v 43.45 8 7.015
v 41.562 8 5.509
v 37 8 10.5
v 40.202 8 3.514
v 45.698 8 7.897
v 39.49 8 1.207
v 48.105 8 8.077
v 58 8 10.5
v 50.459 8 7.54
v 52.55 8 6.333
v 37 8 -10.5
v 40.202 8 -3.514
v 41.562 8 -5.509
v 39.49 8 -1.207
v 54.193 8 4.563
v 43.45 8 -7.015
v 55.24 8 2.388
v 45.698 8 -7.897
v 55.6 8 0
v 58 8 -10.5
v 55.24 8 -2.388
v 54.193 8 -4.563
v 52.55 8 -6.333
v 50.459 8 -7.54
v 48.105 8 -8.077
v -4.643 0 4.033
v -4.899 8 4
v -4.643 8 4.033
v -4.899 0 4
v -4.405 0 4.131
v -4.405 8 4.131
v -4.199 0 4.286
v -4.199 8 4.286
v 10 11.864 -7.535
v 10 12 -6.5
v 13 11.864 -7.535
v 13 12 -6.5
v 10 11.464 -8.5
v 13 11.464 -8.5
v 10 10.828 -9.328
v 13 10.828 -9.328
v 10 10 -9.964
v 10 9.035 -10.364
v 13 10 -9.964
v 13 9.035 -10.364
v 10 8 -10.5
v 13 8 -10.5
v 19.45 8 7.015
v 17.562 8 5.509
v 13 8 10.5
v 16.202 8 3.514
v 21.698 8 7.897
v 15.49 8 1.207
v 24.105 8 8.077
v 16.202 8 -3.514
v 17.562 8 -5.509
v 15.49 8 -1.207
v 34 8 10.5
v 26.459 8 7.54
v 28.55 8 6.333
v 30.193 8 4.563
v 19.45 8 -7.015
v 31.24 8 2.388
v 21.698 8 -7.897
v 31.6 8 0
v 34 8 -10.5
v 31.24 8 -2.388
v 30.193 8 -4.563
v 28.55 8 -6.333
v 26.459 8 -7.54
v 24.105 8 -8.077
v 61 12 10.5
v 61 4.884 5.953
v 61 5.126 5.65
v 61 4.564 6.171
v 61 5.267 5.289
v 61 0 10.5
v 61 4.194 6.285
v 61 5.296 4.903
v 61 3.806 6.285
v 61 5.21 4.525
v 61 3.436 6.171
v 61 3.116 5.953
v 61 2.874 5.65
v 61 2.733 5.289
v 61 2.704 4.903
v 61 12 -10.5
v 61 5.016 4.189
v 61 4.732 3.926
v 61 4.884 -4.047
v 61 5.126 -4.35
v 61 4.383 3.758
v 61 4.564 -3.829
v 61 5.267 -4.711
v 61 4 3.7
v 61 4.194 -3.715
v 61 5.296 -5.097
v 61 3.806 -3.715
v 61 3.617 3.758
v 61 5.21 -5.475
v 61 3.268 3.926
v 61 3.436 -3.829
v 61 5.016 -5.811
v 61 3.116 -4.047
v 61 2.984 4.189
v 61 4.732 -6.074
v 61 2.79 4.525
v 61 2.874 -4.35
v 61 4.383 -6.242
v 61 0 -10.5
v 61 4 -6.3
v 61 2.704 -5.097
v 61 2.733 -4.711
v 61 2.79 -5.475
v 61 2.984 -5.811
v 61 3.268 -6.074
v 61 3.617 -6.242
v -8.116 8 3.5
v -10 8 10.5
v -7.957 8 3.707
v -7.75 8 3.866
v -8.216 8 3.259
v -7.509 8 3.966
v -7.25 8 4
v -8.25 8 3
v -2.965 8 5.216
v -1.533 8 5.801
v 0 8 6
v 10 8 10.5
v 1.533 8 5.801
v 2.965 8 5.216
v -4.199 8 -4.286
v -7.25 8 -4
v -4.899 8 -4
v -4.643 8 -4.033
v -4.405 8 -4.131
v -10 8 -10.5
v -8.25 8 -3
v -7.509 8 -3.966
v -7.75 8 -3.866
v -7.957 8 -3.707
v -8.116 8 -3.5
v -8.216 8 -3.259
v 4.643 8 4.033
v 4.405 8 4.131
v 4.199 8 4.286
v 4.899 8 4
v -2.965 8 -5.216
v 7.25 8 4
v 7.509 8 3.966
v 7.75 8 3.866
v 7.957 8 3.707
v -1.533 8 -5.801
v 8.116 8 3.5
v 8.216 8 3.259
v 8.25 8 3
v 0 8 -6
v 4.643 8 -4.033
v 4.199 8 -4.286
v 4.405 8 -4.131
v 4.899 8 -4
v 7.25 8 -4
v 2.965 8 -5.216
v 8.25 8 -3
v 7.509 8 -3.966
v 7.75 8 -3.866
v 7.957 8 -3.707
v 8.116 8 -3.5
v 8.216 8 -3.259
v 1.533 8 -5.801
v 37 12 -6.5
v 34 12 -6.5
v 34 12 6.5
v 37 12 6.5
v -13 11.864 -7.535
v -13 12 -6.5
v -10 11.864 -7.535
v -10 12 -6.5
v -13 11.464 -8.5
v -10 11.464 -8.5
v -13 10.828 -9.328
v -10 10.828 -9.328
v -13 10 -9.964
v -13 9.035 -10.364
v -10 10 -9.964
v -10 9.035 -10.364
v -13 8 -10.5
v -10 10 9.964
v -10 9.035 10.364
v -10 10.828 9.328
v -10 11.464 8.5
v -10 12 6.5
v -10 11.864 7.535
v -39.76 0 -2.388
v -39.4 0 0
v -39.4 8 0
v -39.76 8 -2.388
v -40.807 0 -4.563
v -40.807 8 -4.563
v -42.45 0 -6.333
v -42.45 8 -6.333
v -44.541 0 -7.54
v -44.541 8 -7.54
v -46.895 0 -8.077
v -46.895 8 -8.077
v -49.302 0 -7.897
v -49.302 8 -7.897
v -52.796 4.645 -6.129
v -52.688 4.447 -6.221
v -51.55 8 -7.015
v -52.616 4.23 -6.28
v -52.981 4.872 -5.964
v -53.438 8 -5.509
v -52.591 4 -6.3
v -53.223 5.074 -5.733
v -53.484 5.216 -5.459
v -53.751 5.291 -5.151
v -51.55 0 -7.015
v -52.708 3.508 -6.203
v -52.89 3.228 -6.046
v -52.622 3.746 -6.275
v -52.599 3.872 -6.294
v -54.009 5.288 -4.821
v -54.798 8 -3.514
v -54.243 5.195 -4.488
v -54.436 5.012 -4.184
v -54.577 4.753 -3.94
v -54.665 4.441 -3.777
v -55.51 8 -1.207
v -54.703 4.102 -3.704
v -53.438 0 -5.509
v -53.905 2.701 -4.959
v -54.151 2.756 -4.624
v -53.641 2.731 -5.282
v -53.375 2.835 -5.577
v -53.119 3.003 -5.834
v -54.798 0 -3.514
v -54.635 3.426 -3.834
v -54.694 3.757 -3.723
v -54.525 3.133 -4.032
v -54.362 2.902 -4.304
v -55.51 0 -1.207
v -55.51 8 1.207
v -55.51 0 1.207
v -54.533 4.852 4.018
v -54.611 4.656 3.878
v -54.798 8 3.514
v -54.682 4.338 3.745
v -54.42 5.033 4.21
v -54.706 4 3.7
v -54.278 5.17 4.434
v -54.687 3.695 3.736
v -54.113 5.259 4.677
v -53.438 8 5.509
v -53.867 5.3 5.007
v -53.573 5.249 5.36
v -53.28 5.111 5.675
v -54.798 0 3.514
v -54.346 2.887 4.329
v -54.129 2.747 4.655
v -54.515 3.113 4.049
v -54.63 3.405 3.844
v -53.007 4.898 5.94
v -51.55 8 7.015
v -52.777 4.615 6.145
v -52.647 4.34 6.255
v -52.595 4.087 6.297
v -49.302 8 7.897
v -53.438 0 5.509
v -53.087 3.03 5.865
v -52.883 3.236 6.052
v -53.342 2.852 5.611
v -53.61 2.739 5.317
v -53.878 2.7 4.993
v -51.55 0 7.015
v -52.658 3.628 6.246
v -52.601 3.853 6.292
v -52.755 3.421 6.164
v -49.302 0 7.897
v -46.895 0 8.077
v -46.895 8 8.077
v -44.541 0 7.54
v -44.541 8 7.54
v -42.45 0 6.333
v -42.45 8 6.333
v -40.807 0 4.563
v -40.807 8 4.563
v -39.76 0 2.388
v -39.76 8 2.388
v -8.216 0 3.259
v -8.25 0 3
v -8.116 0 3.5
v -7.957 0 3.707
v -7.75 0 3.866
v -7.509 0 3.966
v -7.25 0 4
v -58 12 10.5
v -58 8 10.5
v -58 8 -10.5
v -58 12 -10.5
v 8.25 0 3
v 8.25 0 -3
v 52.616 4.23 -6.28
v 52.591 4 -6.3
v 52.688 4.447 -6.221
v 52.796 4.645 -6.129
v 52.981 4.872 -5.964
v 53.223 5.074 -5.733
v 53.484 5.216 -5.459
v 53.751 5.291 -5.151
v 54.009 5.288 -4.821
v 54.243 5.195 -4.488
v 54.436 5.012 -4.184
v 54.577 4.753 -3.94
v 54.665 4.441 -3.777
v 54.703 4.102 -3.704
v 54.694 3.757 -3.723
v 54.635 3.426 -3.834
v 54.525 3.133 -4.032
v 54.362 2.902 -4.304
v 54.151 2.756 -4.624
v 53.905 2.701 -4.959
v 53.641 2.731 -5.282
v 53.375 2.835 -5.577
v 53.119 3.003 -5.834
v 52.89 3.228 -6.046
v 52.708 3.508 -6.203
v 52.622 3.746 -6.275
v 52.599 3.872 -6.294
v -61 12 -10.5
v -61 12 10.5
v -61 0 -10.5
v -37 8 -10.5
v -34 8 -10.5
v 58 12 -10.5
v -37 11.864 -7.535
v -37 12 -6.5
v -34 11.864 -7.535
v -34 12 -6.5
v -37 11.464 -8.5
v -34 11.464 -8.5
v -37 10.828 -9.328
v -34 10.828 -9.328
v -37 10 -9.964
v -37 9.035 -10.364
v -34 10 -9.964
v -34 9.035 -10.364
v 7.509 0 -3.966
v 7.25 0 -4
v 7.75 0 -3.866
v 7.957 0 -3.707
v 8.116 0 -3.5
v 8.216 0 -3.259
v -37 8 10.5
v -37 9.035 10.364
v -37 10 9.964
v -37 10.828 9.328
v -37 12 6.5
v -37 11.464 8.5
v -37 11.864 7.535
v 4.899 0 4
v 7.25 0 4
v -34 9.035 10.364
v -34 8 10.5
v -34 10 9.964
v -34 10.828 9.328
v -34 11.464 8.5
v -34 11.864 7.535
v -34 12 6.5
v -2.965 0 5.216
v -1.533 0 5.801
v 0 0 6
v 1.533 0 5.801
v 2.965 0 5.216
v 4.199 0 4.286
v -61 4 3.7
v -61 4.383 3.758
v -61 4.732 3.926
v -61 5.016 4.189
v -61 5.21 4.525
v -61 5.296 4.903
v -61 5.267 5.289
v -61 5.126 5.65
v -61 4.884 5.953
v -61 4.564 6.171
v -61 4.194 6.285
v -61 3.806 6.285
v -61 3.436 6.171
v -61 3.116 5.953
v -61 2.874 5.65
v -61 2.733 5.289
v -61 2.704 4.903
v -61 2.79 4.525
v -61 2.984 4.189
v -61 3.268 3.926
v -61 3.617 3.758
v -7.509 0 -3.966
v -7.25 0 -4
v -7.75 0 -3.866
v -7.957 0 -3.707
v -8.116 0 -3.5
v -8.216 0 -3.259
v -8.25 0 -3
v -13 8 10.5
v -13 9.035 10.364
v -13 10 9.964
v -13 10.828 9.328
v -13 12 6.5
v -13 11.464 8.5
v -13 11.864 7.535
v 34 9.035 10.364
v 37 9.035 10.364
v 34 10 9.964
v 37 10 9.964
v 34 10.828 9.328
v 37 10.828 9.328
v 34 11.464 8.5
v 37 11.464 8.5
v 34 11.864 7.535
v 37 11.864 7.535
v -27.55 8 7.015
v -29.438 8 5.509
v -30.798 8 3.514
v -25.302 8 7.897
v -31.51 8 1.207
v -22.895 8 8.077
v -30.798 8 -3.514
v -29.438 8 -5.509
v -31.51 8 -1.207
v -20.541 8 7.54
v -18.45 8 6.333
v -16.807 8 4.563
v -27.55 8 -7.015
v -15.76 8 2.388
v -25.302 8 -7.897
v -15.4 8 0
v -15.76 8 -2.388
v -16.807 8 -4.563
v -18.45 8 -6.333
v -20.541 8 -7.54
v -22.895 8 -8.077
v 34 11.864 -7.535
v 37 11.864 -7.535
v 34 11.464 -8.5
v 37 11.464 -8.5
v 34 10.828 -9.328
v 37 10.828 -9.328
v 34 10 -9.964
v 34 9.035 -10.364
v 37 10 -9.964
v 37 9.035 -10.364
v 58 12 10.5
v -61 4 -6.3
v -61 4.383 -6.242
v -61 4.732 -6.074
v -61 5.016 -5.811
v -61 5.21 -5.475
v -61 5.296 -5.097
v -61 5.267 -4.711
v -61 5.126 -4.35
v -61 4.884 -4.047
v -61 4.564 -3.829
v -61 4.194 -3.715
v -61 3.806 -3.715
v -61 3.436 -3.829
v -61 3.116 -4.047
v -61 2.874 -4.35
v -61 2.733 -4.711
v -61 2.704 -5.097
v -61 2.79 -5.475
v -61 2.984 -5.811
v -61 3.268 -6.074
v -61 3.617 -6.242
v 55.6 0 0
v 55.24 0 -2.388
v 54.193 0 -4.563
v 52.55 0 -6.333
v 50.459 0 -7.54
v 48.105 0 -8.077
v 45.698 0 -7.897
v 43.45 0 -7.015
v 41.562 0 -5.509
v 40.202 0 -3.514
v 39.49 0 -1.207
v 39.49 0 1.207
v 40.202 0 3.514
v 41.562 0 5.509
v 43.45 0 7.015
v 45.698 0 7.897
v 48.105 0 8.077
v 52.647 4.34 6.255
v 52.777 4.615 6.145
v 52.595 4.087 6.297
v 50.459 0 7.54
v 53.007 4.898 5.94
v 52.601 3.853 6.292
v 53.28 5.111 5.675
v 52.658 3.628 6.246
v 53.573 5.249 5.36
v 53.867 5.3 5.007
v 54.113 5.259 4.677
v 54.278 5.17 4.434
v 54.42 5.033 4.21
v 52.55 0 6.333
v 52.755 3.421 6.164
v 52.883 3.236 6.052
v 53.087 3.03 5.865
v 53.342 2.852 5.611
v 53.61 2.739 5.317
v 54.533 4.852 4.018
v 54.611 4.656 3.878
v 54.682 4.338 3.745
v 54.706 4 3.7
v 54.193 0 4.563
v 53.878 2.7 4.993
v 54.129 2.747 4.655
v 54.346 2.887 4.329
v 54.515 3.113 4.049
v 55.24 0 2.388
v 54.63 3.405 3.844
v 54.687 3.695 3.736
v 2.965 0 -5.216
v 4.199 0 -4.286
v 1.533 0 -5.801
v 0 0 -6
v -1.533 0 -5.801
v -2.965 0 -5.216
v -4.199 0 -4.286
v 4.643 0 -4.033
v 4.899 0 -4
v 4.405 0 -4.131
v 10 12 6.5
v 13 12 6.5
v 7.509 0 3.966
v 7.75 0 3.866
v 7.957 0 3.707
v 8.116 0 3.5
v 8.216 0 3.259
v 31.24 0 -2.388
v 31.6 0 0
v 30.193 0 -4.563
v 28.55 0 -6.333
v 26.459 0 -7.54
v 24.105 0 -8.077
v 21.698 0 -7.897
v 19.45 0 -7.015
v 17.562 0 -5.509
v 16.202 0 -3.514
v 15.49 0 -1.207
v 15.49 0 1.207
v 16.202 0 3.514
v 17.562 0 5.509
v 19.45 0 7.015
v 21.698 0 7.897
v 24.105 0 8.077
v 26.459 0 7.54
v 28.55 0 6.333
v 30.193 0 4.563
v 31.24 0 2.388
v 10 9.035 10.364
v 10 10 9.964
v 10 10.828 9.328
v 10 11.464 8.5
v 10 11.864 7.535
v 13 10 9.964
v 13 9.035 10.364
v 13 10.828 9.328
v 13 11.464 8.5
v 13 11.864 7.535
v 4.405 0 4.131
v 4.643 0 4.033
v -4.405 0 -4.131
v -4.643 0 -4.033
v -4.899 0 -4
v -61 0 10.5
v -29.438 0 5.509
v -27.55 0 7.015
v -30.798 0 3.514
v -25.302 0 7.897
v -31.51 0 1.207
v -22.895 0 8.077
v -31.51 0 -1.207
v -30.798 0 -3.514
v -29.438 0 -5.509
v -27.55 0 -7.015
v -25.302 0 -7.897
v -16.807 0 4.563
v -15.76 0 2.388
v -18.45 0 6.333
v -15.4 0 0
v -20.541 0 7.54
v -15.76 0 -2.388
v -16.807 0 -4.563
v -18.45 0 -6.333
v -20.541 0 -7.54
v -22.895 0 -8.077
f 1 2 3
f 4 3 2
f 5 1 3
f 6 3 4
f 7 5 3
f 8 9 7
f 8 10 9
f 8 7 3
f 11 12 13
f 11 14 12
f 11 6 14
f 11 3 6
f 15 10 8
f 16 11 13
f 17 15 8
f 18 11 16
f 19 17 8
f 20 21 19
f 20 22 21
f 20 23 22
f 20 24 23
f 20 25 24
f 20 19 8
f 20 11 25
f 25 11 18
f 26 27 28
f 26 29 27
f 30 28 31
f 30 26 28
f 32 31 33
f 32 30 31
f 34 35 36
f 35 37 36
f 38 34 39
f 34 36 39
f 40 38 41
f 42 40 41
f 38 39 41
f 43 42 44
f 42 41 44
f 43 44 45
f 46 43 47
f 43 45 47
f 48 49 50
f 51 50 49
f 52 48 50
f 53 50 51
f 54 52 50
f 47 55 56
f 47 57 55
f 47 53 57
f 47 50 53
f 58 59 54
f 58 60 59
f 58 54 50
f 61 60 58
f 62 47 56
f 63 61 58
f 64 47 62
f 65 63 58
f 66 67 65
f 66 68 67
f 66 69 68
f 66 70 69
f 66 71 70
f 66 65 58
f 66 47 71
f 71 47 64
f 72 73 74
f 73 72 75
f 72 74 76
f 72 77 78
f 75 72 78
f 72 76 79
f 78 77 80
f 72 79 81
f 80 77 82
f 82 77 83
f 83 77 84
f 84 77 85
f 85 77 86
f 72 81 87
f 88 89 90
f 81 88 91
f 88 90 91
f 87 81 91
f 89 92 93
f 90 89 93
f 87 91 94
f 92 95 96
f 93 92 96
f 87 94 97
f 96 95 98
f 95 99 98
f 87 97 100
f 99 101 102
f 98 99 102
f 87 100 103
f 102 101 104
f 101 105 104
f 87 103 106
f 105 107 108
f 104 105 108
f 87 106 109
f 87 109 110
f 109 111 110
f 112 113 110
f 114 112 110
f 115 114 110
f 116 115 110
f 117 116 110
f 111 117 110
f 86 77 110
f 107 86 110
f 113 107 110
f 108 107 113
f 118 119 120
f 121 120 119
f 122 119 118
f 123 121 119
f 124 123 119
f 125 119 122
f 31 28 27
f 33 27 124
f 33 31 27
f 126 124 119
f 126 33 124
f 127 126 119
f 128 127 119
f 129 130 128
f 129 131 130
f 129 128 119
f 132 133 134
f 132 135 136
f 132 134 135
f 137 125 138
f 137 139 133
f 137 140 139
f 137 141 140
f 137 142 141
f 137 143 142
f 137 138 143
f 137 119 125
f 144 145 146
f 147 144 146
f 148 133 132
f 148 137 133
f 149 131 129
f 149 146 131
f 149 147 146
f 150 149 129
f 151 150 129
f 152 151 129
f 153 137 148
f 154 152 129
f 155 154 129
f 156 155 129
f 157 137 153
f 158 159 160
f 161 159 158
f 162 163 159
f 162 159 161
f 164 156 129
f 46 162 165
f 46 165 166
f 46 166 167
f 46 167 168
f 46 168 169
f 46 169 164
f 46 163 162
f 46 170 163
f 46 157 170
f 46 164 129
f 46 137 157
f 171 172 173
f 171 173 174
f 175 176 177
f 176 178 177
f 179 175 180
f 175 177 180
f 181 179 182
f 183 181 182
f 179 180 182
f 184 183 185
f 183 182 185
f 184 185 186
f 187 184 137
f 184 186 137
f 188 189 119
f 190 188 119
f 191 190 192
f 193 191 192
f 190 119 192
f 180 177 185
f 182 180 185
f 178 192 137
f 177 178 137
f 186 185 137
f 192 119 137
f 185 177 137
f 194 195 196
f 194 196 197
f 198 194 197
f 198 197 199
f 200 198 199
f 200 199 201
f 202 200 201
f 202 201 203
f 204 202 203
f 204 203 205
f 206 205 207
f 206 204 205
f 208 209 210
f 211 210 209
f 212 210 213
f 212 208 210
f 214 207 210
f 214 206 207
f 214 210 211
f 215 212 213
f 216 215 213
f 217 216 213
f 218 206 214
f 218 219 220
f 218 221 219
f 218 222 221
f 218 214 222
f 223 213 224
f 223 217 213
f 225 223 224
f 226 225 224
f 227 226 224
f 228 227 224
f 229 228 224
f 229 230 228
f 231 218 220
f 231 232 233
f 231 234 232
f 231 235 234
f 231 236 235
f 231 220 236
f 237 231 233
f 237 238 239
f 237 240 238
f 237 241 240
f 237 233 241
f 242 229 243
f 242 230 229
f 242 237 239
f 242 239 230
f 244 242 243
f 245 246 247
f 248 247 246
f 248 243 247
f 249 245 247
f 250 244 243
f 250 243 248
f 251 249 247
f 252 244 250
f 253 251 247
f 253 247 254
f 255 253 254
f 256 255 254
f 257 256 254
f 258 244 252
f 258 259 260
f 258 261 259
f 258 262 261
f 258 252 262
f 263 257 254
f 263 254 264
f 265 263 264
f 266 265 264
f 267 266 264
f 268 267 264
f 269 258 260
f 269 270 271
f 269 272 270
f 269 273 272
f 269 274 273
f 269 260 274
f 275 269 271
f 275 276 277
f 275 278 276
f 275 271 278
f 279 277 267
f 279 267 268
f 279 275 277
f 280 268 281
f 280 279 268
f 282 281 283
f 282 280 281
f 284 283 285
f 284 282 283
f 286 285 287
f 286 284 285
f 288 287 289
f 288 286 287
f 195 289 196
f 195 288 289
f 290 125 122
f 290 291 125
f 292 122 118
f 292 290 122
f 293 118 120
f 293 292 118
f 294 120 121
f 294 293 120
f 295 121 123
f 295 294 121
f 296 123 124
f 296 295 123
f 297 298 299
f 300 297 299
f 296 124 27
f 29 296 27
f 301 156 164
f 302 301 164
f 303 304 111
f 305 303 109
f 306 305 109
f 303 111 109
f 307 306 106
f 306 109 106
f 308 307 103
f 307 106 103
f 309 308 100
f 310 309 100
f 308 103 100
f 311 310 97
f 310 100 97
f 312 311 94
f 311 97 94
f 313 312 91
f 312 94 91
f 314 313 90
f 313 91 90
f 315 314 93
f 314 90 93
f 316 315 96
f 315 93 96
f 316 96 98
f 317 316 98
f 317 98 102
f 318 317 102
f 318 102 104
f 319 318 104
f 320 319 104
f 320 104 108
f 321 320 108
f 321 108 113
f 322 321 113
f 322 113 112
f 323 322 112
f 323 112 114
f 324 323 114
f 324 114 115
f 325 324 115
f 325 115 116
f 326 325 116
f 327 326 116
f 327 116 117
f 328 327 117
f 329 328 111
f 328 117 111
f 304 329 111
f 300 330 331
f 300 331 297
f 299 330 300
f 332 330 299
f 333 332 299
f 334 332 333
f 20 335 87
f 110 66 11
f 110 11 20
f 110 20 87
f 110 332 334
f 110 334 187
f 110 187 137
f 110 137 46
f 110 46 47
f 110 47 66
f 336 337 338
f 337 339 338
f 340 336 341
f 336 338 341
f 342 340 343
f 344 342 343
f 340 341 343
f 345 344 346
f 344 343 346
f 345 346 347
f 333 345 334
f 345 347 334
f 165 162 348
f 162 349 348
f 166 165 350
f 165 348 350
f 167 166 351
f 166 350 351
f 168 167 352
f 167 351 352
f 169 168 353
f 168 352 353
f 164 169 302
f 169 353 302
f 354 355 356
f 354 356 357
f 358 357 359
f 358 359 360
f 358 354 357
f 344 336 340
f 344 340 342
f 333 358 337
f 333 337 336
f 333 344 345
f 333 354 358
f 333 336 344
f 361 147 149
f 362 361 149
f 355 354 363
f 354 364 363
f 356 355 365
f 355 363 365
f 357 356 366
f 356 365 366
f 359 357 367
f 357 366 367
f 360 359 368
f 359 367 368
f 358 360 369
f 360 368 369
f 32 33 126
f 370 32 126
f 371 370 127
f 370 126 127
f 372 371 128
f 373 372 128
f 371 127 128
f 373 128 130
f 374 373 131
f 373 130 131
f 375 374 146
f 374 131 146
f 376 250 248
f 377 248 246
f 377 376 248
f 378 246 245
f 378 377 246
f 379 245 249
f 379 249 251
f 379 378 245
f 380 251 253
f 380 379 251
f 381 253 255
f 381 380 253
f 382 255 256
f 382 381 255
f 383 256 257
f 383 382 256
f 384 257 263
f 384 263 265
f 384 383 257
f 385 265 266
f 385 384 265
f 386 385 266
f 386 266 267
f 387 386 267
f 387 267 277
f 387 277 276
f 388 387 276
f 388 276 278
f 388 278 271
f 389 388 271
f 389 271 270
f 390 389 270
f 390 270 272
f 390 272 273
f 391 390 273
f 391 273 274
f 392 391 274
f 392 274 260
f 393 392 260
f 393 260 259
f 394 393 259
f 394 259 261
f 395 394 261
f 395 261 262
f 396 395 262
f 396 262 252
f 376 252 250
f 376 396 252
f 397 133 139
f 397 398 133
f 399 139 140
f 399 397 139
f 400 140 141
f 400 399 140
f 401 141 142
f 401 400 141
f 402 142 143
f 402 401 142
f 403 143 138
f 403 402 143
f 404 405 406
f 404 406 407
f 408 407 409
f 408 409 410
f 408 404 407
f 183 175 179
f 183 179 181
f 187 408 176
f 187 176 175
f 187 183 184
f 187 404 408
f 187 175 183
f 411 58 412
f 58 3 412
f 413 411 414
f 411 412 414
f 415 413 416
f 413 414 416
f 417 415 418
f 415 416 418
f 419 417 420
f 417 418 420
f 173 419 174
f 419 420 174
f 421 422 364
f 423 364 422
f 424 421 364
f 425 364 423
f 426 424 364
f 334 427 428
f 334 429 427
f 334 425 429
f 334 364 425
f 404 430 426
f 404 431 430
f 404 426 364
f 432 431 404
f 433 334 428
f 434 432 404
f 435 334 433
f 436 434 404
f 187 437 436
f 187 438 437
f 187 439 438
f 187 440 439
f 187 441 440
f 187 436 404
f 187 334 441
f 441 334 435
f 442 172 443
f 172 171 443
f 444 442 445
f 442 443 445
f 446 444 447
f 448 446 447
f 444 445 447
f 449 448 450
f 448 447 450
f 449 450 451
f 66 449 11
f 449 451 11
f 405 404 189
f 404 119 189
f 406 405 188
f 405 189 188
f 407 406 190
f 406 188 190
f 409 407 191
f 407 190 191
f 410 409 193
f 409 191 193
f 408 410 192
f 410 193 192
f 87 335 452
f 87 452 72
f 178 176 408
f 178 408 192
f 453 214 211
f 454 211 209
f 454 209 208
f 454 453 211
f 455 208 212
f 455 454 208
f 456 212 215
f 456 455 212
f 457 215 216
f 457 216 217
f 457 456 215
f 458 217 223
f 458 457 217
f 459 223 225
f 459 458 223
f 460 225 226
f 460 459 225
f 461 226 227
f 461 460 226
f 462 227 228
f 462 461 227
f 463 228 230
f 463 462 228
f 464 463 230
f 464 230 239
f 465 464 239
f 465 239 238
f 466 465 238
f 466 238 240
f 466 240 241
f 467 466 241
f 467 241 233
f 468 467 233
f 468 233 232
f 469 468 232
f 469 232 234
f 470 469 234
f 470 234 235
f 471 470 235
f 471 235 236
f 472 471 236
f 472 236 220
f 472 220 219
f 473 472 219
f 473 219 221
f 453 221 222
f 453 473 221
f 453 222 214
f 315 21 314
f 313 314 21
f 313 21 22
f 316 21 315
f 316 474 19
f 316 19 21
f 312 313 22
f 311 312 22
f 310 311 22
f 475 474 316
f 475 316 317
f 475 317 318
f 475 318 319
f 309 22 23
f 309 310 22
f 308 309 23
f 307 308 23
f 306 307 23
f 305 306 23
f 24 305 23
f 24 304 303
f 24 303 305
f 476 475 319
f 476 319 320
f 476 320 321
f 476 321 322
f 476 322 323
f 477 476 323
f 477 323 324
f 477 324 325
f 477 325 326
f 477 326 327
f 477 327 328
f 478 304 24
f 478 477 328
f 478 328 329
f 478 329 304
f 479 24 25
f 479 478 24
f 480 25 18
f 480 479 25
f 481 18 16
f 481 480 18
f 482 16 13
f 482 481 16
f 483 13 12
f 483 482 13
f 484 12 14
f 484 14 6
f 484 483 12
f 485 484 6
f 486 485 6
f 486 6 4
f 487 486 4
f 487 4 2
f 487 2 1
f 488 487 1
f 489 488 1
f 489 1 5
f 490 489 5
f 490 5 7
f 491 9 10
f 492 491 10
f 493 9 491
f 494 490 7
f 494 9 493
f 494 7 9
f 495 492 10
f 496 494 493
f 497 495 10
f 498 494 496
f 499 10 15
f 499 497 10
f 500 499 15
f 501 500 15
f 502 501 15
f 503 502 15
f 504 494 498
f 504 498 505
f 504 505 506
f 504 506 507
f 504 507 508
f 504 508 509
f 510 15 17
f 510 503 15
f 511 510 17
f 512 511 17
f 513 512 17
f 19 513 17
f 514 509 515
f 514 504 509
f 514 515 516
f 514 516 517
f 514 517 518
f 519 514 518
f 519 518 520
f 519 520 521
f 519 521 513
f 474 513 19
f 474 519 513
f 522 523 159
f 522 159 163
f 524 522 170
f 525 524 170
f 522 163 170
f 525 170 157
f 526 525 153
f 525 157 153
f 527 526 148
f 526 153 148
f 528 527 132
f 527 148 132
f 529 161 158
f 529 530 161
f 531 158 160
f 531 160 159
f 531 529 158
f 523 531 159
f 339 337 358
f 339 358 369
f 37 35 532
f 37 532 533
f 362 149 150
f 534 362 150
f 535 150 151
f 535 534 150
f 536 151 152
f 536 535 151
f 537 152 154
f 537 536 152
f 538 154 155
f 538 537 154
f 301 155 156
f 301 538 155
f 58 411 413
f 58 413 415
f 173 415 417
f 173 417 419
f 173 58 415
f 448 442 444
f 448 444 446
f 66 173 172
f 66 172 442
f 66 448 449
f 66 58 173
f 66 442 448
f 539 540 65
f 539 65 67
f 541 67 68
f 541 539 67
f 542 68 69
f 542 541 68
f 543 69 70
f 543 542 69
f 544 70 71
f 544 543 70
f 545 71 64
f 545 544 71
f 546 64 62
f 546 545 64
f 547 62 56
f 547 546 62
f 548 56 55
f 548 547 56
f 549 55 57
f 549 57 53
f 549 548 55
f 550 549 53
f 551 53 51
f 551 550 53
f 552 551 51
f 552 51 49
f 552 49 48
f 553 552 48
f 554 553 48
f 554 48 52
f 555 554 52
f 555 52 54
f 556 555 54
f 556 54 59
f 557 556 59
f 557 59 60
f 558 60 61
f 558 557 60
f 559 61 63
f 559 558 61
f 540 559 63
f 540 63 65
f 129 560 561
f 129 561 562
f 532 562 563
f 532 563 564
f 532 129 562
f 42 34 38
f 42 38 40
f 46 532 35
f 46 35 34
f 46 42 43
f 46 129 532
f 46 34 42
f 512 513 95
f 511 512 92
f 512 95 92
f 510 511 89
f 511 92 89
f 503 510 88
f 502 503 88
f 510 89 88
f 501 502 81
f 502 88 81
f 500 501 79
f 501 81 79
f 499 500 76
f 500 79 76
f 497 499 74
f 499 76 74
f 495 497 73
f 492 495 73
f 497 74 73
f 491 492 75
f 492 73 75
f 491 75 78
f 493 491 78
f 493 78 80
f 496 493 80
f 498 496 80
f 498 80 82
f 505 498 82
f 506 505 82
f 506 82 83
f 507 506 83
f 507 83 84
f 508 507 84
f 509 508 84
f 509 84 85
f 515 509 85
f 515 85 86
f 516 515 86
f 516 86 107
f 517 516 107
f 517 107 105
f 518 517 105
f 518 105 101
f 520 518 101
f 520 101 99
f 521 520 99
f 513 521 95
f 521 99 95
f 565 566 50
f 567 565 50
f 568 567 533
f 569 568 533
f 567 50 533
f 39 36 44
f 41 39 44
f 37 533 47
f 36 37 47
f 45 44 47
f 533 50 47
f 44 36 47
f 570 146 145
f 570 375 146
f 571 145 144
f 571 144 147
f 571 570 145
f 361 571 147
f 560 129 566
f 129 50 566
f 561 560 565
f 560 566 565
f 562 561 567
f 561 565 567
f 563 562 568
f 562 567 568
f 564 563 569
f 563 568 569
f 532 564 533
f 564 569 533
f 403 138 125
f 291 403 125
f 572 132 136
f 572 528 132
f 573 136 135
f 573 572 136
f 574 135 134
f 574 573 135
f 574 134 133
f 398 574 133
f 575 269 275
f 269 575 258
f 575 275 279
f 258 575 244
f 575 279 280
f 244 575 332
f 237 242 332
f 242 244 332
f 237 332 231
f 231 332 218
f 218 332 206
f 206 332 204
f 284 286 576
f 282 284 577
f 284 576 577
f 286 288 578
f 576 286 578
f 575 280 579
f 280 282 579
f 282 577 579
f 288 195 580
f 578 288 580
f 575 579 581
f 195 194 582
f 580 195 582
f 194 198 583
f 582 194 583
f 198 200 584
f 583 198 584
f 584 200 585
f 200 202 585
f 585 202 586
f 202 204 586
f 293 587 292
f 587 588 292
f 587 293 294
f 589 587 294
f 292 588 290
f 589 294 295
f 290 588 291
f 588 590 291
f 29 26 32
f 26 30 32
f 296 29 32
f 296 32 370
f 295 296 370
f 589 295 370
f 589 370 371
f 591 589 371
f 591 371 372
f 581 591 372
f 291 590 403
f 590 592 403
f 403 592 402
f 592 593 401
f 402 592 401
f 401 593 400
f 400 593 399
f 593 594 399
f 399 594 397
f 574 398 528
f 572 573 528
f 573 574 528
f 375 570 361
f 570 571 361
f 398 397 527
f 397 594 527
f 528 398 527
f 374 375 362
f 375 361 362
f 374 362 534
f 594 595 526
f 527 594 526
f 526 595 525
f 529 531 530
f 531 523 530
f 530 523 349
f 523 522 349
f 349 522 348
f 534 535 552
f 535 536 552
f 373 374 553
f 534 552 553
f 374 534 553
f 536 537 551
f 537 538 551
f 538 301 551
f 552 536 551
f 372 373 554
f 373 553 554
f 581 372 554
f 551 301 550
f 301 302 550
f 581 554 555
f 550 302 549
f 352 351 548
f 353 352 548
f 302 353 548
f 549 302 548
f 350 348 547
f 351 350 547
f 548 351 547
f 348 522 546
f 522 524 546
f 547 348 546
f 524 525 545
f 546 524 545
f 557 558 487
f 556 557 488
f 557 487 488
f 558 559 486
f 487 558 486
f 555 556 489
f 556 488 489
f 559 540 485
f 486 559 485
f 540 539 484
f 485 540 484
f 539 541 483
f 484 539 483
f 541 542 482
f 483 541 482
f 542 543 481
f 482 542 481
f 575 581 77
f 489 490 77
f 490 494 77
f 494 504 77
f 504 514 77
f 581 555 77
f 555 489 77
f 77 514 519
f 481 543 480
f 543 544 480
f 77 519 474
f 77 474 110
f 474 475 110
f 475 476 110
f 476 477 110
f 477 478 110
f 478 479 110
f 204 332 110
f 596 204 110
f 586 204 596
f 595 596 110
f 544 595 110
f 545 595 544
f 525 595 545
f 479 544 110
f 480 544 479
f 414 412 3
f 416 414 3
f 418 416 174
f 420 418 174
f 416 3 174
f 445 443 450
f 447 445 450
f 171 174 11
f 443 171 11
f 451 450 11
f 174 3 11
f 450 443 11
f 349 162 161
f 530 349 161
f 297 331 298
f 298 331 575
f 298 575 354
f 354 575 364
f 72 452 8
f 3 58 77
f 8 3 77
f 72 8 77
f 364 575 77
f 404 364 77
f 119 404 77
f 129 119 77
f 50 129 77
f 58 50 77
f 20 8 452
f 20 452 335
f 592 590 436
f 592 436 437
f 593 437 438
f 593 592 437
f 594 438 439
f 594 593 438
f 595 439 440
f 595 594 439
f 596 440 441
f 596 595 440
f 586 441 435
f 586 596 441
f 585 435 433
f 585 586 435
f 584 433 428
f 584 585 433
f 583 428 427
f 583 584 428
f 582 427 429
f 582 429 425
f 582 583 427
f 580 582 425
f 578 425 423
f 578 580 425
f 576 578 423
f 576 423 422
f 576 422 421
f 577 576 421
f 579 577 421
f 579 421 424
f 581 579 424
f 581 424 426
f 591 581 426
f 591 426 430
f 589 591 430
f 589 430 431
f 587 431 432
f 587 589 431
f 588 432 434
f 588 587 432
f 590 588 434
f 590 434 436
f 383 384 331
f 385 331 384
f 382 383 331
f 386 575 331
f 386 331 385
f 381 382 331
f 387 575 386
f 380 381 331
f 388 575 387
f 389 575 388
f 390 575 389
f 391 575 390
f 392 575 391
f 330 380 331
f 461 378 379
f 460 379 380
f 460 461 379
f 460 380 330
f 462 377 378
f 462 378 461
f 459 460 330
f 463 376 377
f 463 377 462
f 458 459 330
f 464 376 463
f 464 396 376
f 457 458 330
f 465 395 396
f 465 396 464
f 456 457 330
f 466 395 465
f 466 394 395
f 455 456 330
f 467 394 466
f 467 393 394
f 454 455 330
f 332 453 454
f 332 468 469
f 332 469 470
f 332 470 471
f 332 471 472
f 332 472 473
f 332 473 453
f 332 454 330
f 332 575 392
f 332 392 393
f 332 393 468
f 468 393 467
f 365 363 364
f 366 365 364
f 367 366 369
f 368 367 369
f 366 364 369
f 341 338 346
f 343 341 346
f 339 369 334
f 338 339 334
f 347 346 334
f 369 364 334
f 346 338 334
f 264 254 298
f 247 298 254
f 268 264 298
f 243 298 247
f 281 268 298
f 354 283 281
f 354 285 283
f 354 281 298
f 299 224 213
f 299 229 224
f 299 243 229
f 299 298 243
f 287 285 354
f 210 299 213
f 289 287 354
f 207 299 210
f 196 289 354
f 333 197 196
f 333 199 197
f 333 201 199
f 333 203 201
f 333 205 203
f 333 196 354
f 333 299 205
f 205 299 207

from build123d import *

# Parameters (mm, degrees)
SKETCH1_W           = 122
SKETCH1_H           = 21
SKETCH1_R           = 8.1
BOSS_EXTRUDE1_DEPTH = 8
CUT_EXTRUDE1_DEPTH  = 122
FILLET2_R           = 1
SKETCH6_W           = 3
SKETCH6_H           = 21
BOSS_EXTRUDE4_DEPTH = 4
FILLET3_R           = 4
SKETCH7_R           = 1.3
CUT_EXTRUDE2_DEPTH  = 10


with BuildPart() as part:
    # Sketch1 → Boss-Extrude1 (new body)
    with BuildSketch(Plane(origin=(0, 0, 0), x_dir=(1, 0, 0), z_dir=(0, 1, 0))):
        Rectangle(SKETCH1_W, SKETCH1_H)
        with Locations((-47.5, 0)):
            Circle(SKETCH1_R, mode=Mode.SUBTRACT)
        with Locations((-23.5, 0)):
            Circle(SKETCH1_R, mode=Mode.SUBTRACT)
        with Locations((23.5, 0)):
            Circle(SKETCH1_R, mode=Mode.SUBTRACT)
        with Locations((47.5, 0)):
            Circle(SKETCH1_R, mode=Mode.SUBTRACT)
    extrude(amount=BOSS_EXTRUDE1_DEPTH)

    # Sketch4 → Cut-Extrude1 (cut)
    with BuildSketch(Plane(origin=(0, 8, 0), x_dir=(1, 0, 0), z_dir=(0, 1, 0))):
        with BuildLine():
            Line((8.25, 4), (4.472135955, 4))
            ThreePointArc((4.472135955, 4), (5.605034154, 2.140932539), (6, 0))
            ThreePointArc((6, 0), (5.605034154, -2.140932539), (4.472135955, -4))
            Line((4.472135955, -4), (8.25, -4))
            Line((8.25, -4), (8.25, 4))
        make_face()
        with BuildLine():
            Line((4.472135955, 4), (-4.472135955, 4))
            ThreePointArc((-4.472135955, 4), (-6, 0), (-4.472135955, -4))
            Line((-4.472135955, -4), (4.472135955, -4))
            ThreePointArc((4.472135955, -4), (5.605034154, -2.140932539), (6, 0))
            ThreePointArc((6, 0), (5.605034154, 2.140932539), (4.472135955, 4))
        make_face()
        with BuildLine():
            ThreePointArc((4.472135955, 4), (0, 6), (-4.472135955, 4))
            Line((-4.472135955, 4), (4.472135955, 4))
        make_face()
        with BuildLine():
            Line((4.472135955, -4), (-4.472135955, -4))
            ThreePointArc((-4.472135955, -4), (0, -6), (4.472135955, -4))
        make_face()
        with BuildLine():
            Line((-4.472135955, 4), (-8.25, 4))
            Line((-8.25, 4), (-8.25, -4))
            Line((-8.25, -4), (-4.472135955, -4))
            ThreePointArc((-4.472135955, -4), (-6, 0), (-4.472135955, 4))
        make_face()
    extrude(amount=-CUT_EXTRUDE1_DEPTH, mode=Mode.SUBTRACT)

    # Fillet2
    fillet2_edges = [part.edges().sort_by_distance(p)[0] for p in [
        (4.472135955, 4, -4),
        (8.25, 4, -4),
        (8.25, 4, 4),
        (4.472135955, 4, 4),
        (-4.472135955, 4, 4),
        (-8.25, 4, 4),
        (-8.25, 4, -4),
        (-4.472135955, 4, -4),
    ]]
    fillet(fillet2_edges, radius=FILLET2_R)

    # Sketch6 → Boss-Extrude4 (add)
    with BuildSketch(Plane(origin=(0, 8, 0), x_dir=(1, 0, 0), z_dir=(0, 1, 0))):
        with Locations((-59.5, 0)):
            Rectangle(SKETCH6_W, SKETCH6_H)
        with Locations((-35.5, 0)):
            Rectangle(SKETCH6_W, SKETCH6_H)
        with Locations((35.5, 0)):
            Rectangle(SKETCH6_W, SKETCH6_H)
        with Locations((59.5, 0)):
            Rectangle(SKETCH6_W, SKETCH6_H)
        with Locations((-11.5, 0)):
            Rectangle(SKETCH6_W, SKETCH6_H)
        with Locations((11.5, 0)):
            Rectangle(SKETCH6_W, SKETCH6_H)
    extrude(amount=BOSS_EXTRUDE4_DEPTH)

    # Fillet3
    fillet3_edges = [part.edges().sort_by_distance(p)[0] for p in [
        (35.5, 12, 10.5),
        (11.5, 12, 10.5),
        (-11.5, 12, 10.5),
        (-35.5, 12, 10.5),
        (35.5, 12, -10.5),
        (11.5, 12, -10.5),
        (-11.5, 12, -10.5),
        (-35.5, 12, -10.5),
    ]]
    fillet(fillet3_edges, radius=FILLET3_R)

    # Sketch7 → Cut-Extrude2 (cut)
    with BuildSketch(Plane(origin=(61, 0, 0), x_dir=(0, 0, -1), z_dir=(1, 0, 0))):
        with Locations((-5, 4)):
            Circle(SKETCH7_R)
        with Locations((5, 4)):
            Circle(SKETCH7_R)
    cut_extrude2 = extrude(amount=-CUT_EXTRUDE2_DEPTH, mode=Mode.SUBTRACT)

    # Mirror1: Cut-Extrude2 across plane
    add(cut_extrude2.mirror(Plane(origin=(0, 0, 0), x_dir=(0, 0, 1), z_dir=(1, 0, 0))), mode=Mode.SUBTRACT)


solid = part.part
